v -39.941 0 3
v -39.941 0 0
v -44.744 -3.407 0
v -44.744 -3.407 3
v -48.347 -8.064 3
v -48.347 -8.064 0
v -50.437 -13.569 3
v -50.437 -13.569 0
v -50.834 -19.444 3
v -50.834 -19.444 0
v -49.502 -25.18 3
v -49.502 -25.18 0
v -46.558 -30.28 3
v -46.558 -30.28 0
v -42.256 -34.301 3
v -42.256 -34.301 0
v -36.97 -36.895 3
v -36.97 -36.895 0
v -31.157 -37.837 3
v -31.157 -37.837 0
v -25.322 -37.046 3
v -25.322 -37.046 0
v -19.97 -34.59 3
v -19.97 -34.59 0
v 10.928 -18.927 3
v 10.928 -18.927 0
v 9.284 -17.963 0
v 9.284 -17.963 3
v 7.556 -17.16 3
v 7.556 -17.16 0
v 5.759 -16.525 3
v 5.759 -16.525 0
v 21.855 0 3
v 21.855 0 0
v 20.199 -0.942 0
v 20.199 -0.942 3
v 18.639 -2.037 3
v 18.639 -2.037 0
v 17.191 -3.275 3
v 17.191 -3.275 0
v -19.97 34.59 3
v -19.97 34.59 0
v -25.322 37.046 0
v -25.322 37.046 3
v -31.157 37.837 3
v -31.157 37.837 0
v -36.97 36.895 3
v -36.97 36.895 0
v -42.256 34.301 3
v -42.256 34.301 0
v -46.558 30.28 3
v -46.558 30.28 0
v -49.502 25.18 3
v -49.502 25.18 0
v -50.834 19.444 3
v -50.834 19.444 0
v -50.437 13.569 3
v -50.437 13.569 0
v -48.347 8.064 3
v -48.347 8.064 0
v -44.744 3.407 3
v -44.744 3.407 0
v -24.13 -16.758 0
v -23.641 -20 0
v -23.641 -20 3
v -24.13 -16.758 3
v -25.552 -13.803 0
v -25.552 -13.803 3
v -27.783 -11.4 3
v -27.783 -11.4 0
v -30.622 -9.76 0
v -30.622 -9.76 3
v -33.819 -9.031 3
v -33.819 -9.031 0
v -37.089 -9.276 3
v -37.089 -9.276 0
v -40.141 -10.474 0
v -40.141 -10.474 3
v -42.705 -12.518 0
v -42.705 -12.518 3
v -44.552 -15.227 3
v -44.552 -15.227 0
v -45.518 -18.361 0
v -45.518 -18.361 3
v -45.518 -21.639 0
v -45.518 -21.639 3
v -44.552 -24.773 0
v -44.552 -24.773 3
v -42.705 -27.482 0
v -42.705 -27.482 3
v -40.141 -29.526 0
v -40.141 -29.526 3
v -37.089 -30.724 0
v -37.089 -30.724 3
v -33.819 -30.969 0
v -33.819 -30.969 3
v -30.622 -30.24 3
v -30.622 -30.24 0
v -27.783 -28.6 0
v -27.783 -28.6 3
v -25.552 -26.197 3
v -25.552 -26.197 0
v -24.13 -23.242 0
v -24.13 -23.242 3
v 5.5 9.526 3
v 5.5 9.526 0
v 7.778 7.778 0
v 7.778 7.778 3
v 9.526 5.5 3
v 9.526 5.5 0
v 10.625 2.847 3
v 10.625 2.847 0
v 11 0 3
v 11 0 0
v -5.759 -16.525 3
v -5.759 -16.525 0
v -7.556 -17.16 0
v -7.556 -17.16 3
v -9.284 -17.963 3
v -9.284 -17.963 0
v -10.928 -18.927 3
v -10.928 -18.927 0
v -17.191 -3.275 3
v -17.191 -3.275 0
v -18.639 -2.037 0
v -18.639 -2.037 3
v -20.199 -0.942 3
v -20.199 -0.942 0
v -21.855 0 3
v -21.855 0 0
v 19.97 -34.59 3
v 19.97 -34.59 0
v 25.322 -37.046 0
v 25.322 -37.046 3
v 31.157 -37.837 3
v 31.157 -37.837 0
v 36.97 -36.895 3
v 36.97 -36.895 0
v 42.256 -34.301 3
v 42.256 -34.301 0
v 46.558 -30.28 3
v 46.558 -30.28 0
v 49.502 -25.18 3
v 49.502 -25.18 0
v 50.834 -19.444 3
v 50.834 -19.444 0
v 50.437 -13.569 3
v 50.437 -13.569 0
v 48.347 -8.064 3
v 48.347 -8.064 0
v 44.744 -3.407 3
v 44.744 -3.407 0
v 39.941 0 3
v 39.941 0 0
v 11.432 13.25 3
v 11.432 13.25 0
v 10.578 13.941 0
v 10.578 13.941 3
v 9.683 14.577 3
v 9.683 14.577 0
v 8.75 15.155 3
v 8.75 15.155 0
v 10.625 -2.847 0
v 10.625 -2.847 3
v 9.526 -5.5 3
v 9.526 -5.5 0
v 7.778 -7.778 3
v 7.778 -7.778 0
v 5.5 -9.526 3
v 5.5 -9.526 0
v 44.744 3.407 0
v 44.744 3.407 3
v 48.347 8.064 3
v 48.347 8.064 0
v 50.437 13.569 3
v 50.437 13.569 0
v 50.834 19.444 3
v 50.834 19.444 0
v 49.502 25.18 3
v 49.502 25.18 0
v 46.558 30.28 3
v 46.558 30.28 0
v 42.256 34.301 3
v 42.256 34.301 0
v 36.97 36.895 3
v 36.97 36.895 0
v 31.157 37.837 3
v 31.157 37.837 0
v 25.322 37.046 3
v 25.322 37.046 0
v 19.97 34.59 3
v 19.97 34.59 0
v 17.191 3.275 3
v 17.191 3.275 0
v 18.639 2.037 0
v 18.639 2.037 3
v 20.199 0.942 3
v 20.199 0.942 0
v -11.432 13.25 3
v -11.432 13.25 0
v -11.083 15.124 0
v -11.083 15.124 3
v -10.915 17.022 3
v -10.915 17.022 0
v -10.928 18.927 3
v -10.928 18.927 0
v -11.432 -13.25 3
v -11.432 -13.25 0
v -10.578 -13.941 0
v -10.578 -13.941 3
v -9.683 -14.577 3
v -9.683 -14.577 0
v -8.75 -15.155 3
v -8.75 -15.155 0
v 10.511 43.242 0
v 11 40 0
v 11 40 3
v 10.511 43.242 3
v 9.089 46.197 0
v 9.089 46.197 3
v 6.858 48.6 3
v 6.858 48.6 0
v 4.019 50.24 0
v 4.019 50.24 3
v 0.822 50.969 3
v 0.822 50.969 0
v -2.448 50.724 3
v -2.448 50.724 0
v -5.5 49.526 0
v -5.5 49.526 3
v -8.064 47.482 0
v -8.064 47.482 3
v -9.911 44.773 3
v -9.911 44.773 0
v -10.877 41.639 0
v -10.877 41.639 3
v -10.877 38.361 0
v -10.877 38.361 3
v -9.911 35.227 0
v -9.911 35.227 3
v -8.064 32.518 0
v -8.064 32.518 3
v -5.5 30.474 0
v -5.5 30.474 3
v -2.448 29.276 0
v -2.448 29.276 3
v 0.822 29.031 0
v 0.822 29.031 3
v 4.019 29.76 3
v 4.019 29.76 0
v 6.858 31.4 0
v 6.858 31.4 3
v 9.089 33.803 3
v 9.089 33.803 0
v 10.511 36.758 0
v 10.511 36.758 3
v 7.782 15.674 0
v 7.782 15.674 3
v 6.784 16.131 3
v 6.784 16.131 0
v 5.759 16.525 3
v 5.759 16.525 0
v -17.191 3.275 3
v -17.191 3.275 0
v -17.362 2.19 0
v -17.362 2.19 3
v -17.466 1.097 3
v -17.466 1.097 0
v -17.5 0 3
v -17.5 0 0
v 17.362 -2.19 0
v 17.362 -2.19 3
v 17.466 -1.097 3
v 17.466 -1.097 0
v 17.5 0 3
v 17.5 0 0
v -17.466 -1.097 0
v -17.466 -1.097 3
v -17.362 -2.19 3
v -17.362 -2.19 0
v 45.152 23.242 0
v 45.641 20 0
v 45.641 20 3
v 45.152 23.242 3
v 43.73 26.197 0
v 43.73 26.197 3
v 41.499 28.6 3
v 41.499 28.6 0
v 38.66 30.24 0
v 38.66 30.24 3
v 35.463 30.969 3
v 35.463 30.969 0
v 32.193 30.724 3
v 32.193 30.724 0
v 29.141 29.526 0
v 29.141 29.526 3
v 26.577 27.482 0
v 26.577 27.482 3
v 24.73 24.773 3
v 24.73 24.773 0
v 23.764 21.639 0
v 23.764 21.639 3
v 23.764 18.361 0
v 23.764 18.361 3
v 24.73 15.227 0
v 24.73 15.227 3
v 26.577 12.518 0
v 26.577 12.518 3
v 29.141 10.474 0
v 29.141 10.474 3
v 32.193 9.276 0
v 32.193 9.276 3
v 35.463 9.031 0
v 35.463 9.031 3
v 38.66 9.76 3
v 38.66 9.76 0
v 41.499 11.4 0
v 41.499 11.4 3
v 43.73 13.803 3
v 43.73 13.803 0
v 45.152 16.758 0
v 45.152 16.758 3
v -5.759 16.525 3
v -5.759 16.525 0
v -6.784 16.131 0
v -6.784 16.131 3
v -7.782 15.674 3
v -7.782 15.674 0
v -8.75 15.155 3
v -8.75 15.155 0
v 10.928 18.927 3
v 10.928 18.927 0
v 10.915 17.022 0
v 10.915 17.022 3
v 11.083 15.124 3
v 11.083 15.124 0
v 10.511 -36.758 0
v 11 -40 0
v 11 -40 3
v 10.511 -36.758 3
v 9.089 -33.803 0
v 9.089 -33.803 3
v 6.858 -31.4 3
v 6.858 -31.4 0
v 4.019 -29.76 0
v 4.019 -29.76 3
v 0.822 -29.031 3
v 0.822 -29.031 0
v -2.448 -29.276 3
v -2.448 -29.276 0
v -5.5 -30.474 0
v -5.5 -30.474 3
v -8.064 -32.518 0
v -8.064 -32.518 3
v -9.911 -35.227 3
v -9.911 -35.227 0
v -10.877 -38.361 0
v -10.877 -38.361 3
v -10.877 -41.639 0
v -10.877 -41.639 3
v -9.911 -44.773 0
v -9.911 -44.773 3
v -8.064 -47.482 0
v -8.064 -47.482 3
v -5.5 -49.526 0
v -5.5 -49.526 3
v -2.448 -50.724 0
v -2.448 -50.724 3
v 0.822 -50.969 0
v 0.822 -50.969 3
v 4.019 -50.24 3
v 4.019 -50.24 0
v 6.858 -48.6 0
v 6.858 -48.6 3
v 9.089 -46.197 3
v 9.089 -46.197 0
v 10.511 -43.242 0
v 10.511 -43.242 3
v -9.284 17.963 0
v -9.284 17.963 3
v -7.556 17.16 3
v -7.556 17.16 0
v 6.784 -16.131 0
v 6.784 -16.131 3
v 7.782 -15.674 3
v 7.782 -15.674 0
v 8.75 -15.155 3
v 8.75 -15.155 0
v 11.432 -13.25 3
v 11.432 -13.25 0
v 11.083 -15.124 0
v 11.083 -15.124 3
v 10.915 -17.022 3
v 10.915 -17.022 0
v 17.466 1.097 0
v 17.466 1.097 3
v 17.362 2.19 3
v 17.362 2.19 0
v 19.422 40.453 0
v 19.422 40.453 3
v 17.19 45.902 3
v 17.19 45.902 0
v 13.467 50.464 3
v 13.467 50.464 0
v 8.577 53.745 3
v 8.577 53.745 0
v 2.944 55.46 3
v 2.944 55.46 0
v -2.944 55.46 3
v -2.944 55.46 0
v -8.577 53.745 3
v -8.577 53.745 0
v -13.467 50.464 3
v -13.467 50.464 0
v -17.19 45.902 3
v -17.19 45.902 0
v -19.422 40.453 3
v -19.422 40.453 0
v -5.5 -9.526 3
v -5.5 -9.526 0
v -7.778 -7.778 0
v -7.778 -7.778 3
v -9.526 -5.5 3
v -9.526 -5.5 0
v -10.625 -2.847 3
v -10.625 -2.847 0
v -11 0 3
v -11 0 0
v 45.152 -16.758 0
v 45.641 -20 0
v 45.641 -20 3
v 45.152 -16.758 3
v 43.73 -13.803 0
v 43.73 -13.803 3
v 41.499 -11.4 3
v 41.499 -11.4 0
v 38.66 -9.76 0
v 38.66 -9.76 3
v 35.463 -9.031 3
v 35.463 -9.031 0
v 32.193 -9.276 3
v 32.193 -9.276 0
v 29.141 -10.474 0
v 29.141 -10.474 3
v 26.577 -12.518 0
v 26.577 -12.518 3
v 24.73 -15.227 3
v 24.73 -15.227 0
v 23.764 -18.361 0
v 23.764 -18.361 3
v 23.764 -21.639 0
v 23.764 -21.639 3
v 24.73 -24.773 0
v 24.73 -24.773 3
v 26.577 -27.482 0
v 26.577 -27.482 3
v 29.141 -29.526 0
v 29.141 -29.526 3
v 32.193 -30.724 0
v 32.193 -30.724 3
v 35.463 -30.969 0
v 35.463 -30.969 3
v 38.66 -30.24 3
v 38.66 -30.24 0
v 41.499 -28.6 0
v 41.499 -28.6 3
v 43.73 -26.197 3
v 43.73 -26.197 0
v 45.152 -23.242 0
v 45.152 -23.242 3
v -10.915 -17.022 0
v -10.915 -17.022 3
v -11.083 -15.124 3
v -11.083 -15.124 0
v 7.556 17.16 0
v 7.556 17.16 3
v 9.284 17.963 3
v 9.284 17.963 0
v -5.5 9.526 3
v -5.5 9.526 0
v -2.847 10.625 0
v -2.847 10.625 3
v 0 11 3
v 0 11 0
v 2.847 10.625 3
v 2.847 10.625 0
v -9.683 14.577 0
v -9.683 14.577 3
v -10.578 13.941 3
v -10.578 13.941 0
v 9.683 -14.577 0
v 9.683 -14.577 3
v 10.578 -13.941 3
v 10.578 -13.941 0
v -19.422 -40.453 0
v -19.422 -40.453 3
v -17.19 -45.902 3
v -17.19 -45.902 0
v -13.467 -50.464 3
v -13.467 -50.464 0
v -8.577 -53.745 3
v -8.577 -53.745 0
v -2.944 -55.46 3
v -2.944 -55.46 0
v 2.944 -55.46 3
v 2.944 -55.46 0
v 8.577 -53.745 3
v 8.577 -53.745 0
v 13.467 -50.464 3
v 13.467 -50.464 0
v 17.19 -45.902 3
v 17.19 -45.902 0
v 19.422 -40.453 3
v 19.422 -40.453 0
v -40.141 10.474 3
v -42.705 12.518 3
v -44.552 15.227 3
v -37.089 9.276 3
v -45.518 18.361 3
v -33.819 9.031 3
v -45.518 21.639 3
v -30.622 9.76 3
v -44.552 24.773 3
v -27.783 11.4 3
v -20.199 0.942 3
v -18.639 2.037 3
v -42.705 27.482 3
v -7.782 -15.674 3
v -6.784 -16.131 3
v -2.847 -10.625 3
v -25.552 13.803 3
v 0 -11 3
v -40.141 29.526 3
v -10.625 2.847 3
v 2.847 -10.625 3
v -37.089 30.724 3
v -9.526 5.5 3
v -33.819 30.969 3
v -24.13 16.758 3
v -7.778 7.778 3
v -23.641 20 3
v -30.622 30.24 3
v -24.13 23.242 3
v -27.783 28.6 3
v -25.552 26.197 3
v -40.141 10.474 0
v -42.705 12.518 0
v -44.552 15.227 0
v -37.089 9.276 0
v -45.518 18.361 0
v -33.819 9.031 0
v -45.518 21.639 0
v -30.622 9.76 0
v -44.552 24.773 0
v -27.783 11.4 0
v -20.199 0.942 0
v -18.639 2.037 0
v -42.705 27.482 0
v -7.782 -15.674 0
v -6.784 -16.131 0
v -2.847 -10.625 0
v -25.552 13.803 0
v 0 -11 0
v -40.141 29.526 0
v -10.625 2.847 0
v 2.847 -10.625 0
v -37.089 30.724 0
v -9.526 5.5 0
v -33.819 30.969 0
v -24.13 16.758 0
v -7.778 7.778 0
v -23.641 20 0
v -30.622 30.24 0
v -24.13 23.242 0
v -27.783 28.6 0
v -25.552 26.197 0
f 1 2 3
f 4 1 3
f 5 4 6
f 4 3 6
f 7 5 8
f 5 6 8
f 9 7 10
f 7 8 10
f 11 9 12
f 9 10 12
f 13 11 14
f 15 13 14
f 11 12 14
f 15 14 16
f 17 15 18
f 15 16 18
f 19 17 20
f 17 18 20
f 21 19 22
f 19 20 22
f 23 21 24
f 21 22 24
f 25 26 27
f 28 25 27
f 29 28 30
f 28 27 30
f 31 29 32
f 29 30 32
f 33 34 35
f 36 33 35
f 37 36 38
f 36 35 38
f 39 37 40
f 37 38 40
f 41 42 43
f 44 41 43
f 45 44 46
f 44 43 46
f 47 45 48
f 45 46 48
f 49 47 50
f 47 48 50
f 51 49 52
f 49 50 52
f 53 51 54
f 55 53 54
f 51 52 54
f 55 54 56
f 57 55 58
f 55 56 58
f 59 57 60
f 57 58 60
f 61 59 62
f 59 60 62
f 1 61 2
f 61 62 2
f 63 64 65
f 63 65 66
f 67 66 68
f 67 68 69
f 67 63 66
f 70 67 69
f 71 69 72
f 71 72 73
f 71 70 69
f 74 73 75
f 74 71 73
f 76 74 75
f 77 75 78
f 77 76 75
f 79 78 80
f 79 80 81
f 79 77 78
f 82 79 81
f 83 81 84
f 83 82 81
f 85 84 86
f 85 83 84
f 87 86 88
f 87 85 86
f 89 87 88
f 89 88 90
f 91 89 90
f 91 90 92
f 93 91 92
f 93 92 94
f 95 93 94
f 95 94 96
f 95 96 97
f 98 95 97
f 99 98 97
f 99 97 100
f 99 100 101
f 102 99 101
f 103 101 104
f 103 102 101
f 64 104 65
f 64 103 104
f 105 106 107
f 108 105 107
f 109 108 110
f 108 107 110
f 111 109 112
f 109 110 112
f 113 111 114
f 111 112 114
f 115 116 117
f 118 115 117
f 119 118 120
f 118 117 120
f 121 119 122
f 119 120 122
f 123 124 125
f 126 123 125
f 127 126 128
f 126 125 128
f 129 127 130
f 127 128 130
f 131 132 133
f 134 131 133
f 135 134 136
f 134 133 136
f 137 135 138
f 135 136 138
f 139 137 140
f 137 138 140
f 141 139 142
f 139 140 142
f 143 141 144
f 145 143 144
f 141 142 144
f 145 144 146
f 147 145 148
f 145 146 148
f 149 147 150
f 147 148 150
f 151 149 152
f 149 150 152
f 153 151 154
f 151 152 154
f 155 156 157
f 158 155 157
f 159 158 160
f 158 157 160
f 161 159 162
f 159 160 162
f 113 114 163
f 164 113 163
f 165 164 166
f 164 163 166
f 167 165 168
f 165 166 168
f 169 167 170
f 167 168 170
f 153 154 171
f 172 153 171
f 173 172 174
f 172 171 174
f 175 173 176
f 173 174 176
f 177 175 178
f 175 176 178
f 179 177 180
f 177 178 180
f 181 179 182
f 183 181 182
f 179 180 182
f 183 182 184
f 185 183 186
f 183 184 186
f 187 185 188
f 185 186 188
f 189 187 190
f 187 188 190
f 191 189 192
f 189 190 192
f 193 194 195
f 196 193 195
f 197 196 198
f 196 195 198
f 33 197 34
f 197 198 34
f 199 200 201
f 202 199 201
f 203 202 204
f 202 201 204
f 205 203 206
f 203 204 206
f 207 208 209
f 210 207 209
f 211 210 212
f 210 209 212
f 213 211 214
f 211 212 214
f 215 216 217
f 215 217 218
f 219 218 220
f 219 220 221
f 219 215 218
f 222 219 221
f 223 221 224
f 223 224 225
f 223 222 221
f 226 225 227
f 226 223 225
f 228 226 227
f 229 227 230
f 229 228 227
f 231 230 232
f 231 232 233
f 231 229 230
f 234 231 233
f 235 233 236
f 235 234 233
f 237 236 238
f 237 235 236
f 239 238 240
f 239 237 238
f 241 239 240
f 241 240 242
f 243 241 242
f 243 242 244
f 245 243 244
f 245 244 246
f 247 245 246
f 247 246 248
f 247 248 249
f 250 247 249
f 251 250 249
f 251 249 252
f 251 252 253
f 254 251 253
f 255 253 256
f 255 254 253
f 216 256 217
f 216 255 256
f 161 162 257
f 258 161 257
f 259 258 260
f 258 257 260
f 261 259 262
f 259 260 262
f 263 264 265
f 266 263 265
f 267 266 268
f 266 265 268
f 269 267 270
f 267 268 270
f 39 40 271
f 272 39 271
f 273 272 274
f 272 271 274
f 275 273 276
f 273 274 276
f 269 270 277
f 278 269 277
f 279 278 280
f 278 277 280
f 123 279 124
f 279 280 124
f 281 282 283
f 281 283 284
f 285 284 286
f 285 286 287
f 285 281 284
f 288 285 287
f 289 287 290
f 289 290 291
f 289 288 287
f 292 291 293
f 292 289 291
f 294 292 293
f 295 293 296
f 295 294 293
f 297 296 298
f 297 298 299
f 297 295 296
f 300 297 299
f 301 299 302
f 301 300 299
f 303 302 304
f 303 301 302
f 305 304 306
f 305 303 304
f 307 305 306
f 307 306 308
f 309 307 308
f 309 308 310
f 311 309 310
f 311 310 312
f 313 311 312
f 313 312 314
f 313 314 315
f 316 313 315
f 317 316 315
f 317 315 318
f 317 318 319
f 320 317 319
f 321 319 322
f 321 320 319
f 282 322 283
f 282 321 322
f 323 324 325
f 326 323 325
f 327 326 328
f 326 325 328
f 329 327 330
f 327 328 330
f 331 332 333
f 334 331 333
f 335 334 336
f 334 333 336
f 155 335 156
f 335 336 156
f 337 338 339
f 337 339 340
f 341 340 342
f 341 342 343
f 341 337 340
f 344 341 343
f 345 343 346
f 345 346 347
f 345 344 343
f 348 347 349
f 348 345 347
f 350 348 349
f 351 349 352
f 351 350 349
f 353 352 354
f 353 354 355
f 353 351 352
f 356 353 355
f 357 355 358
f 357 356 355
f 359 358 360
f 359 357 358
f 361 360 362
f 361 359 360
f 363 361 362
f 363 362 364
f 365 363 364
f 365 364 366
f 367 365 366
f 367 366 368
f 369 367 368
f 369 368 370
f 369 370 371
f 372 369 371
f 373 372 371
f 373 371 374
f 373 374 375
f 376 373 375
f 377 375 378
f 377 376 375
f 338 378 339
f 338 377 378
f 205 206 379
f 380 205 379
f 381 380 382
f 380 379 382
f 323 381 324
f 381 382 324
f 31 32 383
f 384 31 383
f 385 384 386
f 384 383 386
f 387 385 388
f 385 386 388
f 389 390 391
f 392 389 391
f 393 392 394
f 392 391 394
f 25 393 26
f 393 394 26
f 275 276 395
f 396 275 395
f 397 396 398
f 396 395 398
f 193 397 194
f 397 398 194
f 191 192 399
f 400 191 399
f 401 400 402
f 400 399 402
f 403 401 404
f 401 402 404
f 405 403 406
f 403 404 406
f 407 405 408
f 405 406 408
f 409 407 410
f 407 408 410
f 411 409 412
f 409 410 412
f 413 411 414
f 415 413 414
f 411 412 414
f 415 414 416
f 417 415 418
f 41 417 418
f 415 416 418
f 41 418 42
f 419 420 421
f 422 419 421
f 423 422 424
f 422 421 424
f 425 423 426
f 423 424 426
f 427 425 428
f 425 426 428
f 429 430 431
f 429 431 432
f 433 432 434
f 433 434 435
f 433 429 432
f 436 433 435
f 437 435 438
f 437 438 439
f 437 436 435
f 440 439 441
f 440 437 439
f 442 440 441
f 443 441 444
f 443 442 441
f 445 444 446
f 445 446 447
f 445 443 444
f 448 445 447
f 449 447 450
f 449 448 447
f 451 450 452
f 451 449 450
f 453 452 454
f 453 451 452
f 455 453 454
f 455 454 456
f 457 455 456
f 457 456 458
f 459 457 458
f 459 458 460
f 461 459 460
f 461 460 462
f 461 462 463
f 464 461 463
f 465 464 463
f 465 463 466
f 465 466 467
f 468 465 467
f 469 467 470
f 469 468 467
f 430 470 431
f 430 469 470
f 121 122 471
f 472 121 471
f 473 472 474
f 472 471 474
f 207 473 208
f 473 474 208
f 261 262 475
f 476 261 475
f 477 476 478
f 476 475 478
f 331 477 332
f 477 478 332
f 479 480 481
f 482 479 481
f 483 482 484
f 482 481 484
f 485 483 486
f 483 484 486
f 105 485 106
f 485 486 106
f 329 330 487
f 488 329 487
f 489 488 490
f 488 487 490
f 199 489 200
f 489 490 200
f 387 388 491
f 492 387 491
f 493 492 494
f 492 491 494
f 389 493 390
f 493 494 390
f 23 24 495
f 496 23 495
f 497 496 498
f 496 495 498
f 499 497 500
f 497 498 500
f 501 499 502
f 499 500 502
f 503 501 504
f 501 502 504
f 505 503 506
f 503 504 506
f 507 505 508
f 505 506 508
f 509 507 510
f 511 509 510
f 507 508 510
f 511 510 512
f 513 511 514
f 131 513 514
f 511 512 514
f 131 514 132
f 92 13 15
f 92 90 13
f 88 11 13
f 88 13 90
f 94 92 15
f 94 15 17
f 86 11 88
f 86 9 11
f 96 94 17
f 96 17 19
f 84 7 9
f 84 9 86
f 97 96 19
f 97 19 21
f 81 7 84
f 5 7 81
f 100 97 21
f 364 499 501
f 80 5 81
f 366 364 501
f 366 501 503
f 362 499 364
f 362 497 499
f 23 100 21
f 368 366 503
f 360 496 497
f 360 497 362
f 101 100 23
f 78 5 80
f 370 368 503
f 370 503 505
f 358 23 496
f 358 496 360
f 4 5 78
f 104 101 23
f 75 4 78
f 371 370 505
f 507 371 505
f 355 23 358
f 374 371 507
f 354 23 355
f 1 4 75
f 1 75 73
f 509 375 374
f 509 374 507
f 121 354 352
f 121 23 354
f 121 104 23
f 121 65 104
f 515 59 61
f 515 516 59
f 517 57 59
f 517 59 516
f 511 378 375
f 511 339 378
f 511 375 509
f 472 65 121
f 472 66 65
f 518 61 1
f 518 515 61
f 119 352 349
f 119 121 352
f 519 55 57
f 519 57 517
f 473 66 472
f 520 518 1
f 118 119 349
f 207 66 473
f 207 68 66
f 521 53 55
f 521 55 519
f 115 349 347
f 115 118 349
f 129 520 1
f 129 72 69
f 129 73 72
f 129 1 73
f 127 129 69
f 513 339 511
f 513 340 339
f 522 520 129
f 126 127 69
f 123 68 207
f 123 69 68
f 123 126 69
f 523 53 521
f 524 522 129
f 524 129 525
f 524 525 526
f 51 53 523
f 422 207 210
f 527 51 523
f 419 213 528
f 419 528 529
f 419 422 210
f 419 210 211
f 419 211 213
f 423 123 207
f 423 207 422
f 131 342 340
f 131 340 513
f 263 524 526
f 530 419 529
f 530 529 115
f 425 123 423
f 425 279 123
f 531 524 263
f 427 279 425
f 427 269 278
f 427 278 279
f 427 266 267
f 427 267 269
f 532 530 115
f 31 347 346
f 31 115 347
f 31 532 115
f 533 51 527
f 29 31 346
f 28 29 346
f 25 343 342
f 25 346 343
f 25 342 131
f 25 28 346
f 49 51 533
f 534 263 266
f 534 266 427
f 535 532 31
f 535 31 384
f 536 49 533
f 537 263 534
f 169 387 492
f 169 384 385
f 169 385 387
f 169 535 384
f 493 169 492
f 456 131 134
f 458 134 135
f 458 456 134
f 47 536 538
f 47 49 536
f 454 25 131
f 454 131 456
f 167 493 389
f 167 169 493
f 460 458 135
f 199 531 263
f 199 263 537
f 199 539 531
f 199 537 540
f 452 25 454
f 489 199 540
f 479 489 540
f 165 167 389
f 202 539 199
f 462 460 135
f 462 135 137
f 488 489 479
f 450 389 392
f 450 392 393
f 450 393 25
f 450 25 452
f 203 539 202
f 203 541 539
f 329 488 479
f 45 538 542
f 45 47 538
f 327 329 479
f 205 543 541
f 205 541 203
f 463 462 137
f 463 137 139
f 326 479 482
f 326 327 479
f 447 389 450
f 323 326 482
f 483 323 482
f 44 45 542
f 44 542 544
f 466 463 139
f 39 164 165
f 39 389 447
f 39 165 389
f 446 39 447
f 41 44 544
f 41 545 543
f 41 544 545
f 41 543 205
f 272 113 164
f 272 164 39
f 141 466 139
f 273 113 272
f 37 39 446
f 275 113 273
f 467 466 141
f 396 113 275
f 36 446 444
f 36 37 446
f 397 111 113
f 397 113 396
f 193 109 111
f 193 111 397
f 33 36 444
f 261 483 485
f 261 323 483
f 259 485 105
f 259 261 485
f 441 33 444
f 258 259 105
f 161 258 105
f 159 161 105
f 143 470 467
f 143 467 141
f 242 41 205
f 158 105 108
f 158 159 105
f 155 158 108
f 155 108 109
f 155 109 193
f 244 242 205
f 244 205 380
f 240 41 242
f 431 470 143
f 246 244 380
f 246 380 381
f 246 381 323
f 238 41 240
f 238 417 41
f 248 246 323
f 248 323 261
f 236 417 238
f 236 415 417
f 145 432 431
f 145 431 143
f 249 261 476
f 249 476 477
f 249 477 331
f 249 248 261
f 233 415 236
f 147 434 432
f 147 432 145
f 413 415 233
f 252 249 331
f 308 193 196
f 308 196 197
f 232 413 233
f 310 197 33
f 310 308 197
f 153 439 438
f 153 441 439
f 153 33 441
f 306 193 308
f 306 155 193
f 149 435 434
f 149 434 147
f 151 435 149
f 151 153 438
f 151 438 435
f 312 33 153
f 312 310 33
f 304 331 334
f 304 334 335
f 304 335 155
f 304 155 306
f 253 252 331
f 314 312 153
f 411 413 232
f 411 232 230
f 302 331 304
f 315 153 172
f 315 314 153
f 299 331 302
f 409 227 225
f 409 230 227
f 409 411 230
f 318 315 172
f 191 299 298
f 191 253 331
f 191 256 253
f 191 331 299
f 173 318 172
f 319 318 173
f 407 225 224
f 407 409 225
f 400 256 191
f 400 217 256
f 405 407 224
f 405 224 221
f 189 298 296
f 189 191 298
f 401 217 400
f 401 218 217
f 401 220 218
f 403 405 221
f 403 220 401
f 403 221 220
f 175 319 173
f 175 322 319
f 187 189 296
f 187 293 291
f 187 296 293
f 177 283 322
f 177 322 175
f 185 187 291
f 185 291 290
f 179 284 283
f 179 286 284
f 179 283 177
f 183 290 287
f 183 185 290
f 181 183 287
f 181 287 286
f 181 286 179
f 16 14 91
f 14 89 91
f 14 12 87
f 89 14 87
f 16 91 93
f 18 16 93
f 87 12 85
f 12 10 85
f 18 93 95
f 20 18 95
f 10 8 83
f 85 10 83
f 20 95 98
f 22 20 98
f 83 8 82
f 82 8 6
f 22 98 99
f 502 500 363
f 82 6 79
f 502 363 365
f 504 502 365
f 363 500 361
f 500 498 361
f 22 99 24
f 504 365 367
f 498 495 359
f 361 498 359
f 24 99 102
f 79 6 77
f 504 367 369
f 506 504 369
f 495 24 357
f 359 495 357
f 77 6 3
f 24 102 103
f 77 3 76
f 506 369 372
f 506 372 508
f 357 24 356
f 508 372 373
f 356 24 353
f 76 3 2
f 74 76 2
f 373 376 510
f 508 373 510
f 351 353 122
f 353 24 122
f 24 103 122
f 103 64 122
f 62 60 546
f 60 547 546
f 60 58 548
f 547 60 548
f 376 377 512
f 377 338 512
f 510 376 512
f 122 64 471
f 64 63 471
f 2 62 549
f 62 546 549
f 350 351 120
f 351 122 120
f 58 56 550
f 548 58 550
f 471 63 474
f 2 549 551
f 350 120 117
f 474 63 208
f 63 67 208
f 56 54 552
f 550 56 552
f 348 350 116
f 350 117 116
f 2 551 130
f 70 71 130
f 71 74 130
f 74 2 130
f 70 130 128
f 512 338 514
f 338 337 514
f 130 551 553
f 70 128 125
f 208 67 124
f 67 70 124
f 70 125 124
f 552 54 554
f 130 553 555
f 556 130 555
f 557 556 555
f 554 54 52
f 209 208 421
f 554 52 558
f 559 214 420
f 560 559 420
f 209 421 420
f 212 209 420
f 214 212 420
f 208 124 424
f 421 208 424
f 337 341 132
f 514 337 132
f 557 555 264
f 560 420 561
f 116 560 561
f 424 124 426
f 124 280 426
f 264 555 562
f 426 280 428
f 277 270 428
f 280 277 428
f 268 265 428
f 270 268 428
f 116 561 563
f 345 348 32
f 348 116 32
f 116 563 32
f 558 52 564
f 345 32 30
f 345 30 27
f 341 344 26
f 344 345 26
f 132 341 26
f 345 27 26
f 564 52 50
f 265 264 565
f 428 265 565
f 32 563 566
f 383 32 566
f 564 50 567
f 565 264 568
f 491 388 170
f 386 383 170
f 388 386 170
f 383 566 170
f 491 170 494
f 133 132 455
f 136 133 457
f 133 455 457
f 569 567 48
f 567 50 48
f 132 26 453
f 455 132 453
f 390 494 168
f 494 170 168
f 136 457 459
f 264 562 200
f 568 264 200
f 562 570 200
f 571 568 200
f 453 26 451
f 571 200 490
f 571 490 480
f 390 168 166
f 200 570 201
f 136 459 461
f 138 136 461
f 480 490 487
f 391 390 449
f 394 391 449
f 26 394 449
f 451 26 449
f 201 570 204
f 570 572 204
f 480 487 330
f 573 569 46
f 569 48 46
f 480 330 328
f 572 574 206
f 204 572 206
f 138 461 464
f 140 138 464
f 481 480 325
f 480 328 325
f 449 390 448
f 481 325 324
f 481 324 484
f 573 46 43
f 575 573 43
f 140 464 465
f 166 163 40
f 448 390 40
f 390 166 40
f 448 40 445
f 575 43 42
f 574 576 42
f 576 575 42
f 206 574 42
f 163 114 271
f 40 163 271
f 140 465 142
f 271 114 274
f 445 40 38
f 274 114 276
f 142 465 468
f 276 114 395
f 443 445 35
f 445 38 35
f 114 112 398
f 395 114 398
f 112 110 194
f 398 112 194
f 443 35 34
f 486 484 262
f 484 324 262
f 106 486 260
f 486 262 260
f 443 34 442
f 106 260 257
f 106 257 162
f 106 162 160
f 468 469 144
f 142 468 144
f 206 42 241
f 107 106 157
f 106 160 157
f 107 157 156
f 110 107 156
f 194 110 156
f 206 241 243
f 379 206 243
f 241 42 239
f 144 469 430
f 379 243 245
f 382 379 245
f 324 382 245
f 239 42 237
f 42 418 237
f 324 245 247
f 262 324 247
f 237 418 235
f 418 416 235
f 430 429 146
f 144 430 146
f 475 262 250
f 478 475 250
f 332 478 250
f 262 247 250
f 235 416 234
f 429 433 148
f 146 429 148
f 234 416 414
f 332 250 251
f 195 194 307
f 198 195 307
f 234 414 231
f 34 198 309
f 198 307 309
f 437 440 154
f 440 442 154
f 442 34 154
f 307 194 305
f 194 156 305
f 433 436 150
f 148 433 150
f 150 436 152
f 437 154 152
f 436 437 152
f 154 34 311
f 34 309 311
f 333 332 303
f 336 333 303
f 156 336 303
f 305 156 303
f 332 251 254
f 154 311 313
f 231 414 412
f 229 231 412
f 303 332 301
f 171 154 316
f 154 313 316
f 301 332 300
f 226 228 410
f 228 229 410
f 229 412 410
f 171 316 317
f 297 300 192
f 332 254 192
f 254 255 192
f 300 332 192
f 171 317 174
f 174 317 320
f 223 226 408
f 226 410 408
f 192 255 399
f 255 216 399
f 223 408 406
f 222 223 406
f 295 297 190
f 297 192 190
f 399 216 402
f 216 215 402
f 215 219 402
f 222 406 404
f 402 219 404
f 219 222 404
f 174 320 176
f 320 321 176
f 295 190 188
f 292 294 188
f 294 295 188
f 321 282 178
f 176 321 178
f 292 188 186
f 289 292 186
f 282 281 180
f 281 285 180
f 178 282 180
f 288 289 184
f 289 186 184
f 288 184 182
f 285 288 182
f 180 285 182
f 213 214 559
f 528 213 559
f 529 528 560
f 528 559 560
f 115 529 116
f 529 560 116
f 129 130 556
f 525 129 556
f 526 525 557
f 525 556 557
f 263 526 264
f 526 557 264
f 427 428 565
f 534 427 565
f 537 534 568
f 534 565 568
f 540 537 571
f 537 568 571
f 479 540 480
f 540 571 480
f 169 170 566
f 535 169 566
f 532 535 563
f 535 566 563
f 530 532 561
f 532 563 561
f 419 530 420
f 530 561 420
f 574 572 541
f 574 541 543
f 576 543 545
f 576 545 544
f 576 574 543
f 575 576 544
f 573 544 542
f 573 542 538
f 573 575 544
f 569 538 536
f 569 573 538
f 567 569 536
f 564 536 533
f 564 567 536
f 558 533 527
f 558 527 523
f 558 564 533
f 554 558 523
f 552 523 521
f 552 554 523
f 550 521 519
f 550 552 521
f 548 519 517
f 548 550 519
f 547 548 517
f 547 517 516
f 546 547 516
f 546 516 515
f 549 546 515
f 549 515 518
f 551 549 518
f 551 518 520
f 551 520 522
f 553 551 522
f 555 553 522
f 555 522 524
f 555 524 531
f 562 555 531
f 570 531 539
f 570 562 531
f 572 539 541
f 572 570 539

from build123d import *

# Parameters (mm, degrees)
F0_R     = 11
F1_DEPTH = 3


with BuildPart() as f1:
    # F0 (on Top) → F1 (new body)
    with BuildSketch(Plane.XY):
        with BuildLine():
            ThreePointArc((39.940735, 0), (48.218565, 27.839001), (19.970367, 34.589691))
            ThreePointArc((19.970367, 34.589691), (0, 55.678003), (-19.970367, 34.589691))
            ThreePointArc((-19.970367, 34.589691), (-48.218565, 27.839001), (-39.940735, 0))
            ThreePointArc((-39.940735, 0), (-48.218565, -27.839001), (-19.970367, -34.589691))
            ThreePointArc((-19.970367, -34.589691), (0, -55.678003), (19.970367, -34.589691))
            ThreePointArc((19.970367, -34.589691), (48.218565, -27.839001), (39.940735, 0))
        make_face()
        with Locations((0, -40)):
            Circle(F0_R, mode=Mode.SUBTRACT)
        with Locations((-34.641016, -20)):
            Circle(F0_R, mode=Mode.SUBTRACT)
        with BuildLine():
            ThreePointArc((-5.759242, -16.525167), (-8.429472, -17.541189), (-10.927689, -18.927313))
            ThreePointArc((-10.927689, -18.927313), (-10.97638, -16.070731), (-11.431593, -13.250233))
            ThreePointArc((-11.431593, -13.250233), (-10.135662, -14.265986), (-8.75, -15.155445))
            ThreePointArc((-8.75, -15.155445), (-7.286876, -15.910734), (-5.759242, -16.525167))
        make_face(mode=Mode.SUBTRACT)
        with BuildLine():
            ThreePointArc((11.431593, -13.250233), (10.97638, -16.070731), (10.927689, -18.927313))
            ThreePointArc((10.927689, -18.927313), (8.429472, -17.541189), (5.759242, -16.525167))
            ThreePointArc((5.759242, -16.525167), (7.286876, -15.910734), (8.75, -15.155445))
            ThreePointArc((8.75, -15.155445), (10.135662, -14.265986), (11.431593, -13.250233))
        make_face(mode=Mode.SUBTRACT)
        with BuildLine():
            ThreePointArc((17.190835, 3.274934), (19.405852, 1.470458), (21.855379, 0))
            ThreePointArc((21.855379, 0), (19.405852, -1.470458), (17.190835, -3.274934))
            ThreePointArc((17.190835, -3.274934), (17.422537, -1.644747), (17.5, 0))
            ThreePointArc((17.5, 0), (17.422537, 1.644747), (17.190835, 3.274934))
        make_face(mode=Mode.SUBTRACT)
        with Locations((34.641016, -20)):
            Circle(F0_R, mode=Mode.SUBTRACT)
        with Locations((-34.641016, 20)):
            Circle(F0_R, mode=Mode.SUBTRACT)
        with BuildLine():
            ThreePointArc((-17.190835, -3.274934), (-19.405852, -1.470458), (-21.855379, 0))
            ThreePointArc((-21.855379, 0), (-19.405852, 1.470458), (-17.190835, 3.274934))
            ThreePointArc((-17.190835, 3.274934), (-17.422537, 1.644747), (-17.5, 0))
            ThreePointArc((-17.5, 0), (-17.422537, -1.644747), (-17.190835, -3.274934))
        make_face(mode=Mode.SUBTRACT)
        with BuildLine():
            ThreePointArc((-5.5, 9.526279), (0, 11), (5.5, 9.526279))
            ThreePointArc((5.5, 9.526279), (9.526279, 5.5), (11, 0))
            ThreePointArc((11, 0), (9.526279, -5.5), (5.5, -9.526279))
            ThreePointArc((5.5, -9.526279), (0, -11), (-5.5, -9.526279))
            ThreePointArc((-5.5, -9.526279), (-9.526279, -5.5), (-11, 0))
            ThreePointArc((-11, 0), (-9.526279, 5.5), (-5.5, 9.526279))
        make_face(mode=Mode.SUBTRACT)
        with BuildLine():
            ThreePointArc((-10.927689, 18.927313), (-8.429472, 17.541189), (-5.759242, 16.525167))
            ThreePointArc((-5.759242, 16.525167), (-7.286876, 15.910734), (-8.75, 15.155445))
            ThreePointArc((-8.75, 15.155445), (-10.135662, 14.265986), (-11.431593, 13.250233))
            ThreePointArc((-11.431593, 13.250233), (-10.97638, 16.070731), (-10.927689, 18.927313))
        make_face(mode=Mode.SUBTRACT)
        with Locations((0, 40)):
            Circle(F0_R, mode=Mode.SUBTRACT)
        with BuildLine():
            ThreePointArc((8.75, 15.155445), (7.286876, 15.910734), (5.759242, 16.525167))
            ThreePointArc((5.759242, 16.525167), (8.429472, 17.541189), (10.927689, 18.927313))
            ThreePointArc((10.927689, 18.927313), (10.97638, 16.070731), (11.431593, 13.250233))
            ThreePointArc((11.431593, 13.250233), (10.135662, 14.265986), (8.75, 15.155445))
        make_face(mode=Mode.SUBTRACT)
        with Locations((34.641016, 20)):
            Circle(F0_R, mode=Mode.SUBTRACT)
    extrude(amount=F1_DEPTH)


solid = f1.part
